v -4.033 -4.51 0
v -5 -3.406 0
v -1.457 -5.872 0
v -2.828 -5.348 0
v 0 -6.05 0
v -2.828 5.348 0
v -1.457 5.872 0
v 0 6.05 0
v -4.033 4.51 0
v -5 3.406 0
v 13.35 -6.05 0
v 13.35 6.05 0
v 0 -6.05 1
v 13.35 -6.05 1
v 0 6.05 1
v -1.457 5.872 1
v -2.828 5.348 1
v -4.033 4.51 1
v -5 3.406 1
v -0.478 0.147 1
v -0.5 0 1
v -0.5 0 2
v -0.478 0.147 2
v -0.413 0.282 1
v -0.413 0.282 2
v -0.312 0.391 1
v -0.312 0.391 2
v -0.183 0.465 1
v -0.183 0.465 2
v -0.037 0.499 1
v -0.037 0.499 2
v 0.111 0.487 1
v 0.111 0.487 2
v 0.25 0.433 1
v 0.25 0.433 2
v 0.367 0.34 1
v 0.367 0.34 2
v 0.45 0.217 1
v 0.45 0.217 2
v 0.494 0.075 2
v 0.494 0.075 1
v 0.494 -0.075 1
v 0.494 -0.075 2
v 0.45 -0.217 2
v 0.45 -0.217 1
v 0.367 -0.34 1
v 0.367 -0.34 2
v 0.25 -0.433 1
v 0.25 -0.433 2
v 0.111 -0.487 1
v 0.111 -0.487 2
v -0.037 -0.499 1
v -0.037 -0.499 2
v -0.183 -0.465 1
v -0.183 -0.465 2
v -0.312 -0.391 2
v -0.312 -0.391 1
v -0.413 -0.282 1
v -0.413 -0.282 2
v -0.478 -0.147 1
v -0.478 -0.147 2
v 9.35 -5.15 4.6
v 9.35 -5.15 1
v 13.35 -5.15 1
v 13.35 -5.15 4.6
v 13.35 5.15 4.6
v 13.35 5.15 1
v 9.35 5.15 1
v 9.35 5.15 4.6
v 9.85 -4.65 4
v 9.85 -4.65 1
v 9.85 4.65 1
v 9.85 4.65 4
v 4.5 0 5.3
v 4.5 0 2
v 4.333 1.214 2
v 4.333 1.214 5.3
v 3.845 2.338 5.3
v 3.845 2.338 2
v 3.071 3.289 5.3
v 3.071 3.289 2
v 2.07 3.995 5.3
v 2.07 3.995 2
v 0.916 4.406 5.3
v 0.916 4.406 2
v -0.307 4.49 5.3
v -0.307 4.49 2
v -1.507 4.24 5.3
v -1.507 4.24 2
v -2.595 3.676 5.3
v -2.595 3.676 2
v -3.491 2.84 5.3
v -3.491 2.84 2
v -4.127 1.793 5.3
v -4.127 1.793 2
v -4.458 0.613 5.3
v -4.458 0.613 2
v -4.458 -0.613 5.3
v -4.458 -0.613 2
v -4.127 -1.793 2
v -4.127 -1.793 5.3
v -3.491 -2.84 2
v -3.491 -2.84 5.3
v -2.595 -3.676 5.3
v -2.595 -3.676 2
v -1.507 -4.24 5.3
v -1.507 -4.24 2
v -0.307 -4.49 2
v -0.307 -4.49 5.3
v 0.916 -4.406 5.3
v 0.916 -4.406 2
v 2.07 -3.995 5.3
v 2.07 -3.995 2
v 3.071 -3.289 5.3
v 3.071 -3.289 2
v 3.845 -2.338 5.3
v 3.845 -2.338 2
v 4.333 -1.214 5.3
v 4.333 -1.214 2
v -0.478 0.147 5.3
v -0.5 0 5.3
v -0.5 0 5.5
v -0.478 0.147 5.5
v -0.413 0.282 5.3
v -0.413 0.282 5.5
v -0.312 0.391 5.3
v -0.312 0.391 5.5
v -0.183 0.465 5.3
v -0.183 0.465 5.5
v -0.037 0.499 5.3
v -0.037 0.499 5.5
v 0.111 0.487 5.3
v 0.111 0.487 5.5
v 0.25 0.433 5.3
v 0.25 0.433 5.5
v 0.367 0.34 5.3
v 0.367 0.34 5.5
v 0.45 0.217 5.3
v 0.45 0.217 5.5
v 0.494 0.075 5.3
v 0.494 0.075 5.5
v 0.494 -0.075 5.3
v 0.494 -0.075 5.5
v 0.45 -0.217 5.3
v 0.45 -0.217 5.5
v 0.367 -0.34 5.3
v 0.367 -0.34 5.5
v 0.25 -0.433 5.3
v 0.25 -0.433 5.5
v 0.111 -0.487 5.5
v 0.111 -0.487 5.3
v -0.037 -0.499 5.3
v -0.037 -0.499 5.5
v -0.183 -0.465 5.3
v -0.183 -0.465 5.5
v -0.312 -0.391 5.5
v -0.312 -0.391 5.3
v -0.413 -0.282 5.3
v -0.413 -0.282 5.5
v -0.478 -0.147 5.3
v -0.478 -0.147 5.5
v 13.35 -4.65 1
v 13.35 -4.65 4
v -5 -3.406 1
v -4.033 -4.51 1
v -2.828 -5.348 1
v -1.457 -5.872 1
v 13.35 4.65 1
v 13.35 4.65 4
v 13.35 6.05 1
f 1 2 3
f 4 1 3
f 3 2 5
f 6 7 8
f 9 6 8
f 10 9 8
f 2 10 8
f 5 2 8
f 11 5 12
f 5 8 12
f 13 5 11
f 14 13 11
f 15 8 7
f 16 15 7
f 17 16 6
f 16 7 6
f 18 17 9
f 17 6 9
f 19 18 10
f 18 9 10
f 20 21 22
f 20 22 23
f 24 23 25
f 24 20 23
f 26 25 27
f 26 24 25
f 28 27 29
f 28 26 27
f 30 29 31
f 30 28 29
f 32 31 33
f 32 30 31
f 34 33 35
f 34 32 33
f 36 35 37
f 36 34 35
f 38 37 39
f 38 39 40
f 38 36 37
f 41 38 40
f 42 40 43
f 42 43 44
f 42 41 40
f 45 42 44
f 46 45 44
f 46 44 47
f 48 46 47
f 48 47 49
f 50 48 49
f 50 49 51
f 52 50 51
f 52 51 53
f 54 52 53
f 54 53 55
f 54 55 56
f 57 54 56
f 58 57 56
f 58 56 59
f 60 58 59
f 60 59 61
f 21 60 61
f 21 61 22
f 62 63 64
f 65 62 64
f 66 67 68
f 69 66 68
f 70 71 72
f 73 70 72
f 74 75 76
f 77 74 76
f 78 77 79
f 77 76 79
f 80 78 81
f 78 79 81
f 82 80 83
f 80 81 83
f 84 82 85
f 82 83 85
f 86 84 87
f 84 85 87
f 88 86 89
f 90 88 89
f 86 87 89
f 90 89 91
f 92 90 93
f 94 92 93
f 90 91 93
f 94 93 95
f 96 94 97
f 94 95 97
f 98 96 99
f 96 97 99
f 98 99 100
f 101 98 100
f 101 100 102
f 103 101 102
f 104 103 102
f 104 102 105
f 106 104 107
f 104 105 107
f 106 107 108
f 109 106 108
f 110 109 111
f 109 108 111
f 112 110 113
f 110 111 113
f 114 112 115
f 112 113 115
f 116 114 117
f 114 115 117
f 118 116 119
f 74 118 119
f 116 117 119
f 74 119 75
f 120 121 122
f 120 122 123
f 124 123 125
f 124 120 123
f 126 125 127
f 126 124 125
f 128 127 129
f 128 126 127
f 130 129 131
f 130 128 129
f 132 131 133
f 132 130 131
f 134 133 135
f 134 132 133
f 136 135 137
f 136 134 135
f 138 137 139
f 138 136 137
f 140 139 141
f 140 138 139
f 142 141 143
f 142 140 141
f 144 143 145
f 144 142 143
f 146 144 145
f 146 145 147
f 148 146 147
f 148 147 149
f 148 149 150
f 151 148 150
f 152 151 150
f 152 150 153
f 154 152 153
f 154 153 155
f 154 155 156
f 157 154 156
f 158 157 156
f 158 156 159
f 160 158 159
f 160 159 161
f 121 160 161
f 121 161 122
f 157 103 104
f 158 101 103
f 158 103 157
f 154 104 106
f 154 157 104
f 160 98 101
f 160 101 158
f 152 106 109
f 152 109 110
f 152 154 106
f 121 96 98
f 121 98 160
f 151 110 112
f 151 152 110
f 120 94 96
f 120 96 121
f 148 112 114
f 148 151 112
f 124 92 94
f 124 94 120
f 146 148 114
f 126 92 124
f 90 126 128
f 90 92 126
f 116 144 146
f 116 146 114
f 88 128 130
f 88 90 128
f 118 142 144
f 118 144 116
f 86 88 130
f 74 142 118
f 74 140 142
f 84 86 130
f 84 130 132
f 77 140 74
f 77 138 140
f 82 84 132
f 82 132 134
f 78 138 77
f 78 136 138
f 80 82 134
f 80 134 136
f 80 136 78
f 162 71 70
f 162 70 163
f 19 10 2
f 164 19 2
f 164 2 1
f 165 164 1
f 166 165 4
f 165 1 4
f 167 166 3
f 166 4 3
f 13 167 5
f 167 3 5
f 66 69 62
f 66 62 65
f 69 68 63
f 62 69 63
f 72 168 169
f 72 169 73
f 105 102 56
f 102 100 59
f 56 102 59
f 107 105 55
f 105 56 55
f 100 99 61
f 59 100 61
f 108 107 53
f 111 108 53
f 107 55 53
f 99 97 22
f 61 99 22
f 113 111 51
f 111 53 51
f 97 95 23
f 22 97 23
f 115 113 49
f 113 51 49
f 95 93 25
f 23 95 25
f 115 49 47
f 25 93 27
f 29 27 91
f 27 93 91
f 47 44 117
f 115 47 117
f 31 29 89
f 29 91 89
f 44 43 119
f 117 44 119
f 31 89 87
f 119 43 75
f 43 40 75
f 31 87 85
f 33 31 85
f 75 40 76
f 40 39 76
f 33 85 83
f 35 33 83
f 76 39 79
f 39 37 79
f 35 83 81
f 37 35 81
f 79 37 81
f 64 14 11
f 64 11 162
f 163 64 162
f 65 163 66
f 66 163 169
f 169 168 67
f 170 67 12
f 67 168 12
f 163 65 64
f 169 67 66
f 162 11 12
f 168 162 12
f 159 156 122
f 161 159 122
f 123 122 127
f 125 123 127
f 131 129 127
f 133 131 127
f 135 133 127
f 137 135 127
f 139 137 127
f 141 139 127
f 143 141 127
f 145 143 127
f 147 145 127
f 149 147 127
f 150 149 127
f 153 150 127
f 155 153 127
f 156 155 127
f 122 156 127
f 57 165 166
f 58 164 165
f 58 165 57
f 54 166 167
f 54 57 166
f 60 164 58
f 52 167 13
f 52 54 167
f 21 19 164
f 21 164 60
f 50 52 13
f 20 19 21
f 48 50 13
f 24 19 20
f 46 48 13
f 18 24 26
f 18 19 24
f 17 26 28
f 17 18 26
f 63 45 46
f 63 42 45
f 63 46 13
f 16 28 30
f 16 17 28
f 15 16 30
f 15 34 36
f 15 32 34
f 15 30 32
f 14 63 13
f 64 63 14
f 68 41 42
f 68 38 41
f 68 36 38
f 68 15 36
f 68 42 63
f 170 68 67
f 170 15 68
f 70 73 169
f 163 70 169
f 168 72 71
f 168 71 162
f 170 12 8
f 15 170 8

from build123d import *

# Parameters (mm, degrees)
SKETCH_1_R          = 0.5
EXTRUDE_1_DEPTH     = 1
SKETCH_3_R          = 0.5
EXTRUDE_2_DEPTH     = 5.5
SKETCH_4_R          = 4.5
EXTRUDE_3_DEPTH     = 3.3
EXTRUDE_4_DEPTH     = 3.6
SKETCH_6_W          = 3
SKETCH_6_H          = 9.3
SKETCH_6_W_2        = 0.5
CUT_EXTRUDE_1_DEPTH = 3


with BuildPart() as part:
    # 草图1 → 凸台-拉伸1 (new body)
    # profile 1 of 2: a face of its own
    with BuildSketch(Plane.XY):
        with BuildLine():
            Line((5, -3.406244266), (5, 3.406244266))
            ThreePointArc((5, 3.406244266), (0, 6.05), (-5, 3.406244266))
            Line((-5, 3.406244266), (-5, -3.406244266))
            ThreePointArc((-5, -3.406244266), (0, -6.05), (5, -3.406244266))
        make_face()
        Circle(SKETCH_1_R, mode=Mode.SUBTRACT)
    # profile 2 of 2: a face of its own
    with BuildSketch(Plane.XY):
        with BuildLine():
            Line((13.35, 6.05), (0, 6.05))
            ThreePointArc((0, 6.05), (2.827960589, 5.348377222), (5, 3.406244266))
            Line((5, 3.406244266), (5, -3.406244266))
            ThreePointArc((5, -3.406244266), (2.827960589, -5.348377222), (0, -6.05))
            Line((0, -6.05), (13.35, -6.05))
            Line((13.35, -6.05), (13.35, 6.05))
        make_face()
    extrude(amount=EXTRUDE_1_DEPTH)

    # 草图3 → 凸台-拉伸2 (add)
    with BuildSketch(Plane(origin=(0, 0, 0), x_dir=(-1, 0, 0), z_dir=(0, 0, -1))):
        Circle(SKETCH_3_R)
    extrude(amount=-EXTRUDE_2_DEPTH)

    # 草图4 → 凸台-拉伸3 (add)
    with BuildSketch(Plane.XY.offset(2)):
        Circle(SKETCH_4_R)
    extrude(amount=EXTRUDE_3_DEPTH)

    # 草图5 → 凸台-拉伸4 (add)
    with BuildSketch(Plane.XY.offset(1)):
        Polygon((13.35, 0), (13.35, 5.15), (9.35, 5.15), (9.35, -5.15), (13.35, -5.15), align=None)
    extrude(amount=EXTRUDE_4_DEPTH)

    # 草图6 → 切除-拉伸1 (cut)
    with BuildSketch(Plane.XY.offset(1)):
        with Locations((11.35, 0)):
            Rectangle(SKETCH_6_W, SKETCH_6_H)
        with Locations((13.1, 0)):
            Rectangle(SKETCH_6_W_2, SKETCH_6_H)
    extrude(amount=CUT_EXTRUDE_1_DEPTH, mode=Mode.SUBTRACT)


solid = part.part
